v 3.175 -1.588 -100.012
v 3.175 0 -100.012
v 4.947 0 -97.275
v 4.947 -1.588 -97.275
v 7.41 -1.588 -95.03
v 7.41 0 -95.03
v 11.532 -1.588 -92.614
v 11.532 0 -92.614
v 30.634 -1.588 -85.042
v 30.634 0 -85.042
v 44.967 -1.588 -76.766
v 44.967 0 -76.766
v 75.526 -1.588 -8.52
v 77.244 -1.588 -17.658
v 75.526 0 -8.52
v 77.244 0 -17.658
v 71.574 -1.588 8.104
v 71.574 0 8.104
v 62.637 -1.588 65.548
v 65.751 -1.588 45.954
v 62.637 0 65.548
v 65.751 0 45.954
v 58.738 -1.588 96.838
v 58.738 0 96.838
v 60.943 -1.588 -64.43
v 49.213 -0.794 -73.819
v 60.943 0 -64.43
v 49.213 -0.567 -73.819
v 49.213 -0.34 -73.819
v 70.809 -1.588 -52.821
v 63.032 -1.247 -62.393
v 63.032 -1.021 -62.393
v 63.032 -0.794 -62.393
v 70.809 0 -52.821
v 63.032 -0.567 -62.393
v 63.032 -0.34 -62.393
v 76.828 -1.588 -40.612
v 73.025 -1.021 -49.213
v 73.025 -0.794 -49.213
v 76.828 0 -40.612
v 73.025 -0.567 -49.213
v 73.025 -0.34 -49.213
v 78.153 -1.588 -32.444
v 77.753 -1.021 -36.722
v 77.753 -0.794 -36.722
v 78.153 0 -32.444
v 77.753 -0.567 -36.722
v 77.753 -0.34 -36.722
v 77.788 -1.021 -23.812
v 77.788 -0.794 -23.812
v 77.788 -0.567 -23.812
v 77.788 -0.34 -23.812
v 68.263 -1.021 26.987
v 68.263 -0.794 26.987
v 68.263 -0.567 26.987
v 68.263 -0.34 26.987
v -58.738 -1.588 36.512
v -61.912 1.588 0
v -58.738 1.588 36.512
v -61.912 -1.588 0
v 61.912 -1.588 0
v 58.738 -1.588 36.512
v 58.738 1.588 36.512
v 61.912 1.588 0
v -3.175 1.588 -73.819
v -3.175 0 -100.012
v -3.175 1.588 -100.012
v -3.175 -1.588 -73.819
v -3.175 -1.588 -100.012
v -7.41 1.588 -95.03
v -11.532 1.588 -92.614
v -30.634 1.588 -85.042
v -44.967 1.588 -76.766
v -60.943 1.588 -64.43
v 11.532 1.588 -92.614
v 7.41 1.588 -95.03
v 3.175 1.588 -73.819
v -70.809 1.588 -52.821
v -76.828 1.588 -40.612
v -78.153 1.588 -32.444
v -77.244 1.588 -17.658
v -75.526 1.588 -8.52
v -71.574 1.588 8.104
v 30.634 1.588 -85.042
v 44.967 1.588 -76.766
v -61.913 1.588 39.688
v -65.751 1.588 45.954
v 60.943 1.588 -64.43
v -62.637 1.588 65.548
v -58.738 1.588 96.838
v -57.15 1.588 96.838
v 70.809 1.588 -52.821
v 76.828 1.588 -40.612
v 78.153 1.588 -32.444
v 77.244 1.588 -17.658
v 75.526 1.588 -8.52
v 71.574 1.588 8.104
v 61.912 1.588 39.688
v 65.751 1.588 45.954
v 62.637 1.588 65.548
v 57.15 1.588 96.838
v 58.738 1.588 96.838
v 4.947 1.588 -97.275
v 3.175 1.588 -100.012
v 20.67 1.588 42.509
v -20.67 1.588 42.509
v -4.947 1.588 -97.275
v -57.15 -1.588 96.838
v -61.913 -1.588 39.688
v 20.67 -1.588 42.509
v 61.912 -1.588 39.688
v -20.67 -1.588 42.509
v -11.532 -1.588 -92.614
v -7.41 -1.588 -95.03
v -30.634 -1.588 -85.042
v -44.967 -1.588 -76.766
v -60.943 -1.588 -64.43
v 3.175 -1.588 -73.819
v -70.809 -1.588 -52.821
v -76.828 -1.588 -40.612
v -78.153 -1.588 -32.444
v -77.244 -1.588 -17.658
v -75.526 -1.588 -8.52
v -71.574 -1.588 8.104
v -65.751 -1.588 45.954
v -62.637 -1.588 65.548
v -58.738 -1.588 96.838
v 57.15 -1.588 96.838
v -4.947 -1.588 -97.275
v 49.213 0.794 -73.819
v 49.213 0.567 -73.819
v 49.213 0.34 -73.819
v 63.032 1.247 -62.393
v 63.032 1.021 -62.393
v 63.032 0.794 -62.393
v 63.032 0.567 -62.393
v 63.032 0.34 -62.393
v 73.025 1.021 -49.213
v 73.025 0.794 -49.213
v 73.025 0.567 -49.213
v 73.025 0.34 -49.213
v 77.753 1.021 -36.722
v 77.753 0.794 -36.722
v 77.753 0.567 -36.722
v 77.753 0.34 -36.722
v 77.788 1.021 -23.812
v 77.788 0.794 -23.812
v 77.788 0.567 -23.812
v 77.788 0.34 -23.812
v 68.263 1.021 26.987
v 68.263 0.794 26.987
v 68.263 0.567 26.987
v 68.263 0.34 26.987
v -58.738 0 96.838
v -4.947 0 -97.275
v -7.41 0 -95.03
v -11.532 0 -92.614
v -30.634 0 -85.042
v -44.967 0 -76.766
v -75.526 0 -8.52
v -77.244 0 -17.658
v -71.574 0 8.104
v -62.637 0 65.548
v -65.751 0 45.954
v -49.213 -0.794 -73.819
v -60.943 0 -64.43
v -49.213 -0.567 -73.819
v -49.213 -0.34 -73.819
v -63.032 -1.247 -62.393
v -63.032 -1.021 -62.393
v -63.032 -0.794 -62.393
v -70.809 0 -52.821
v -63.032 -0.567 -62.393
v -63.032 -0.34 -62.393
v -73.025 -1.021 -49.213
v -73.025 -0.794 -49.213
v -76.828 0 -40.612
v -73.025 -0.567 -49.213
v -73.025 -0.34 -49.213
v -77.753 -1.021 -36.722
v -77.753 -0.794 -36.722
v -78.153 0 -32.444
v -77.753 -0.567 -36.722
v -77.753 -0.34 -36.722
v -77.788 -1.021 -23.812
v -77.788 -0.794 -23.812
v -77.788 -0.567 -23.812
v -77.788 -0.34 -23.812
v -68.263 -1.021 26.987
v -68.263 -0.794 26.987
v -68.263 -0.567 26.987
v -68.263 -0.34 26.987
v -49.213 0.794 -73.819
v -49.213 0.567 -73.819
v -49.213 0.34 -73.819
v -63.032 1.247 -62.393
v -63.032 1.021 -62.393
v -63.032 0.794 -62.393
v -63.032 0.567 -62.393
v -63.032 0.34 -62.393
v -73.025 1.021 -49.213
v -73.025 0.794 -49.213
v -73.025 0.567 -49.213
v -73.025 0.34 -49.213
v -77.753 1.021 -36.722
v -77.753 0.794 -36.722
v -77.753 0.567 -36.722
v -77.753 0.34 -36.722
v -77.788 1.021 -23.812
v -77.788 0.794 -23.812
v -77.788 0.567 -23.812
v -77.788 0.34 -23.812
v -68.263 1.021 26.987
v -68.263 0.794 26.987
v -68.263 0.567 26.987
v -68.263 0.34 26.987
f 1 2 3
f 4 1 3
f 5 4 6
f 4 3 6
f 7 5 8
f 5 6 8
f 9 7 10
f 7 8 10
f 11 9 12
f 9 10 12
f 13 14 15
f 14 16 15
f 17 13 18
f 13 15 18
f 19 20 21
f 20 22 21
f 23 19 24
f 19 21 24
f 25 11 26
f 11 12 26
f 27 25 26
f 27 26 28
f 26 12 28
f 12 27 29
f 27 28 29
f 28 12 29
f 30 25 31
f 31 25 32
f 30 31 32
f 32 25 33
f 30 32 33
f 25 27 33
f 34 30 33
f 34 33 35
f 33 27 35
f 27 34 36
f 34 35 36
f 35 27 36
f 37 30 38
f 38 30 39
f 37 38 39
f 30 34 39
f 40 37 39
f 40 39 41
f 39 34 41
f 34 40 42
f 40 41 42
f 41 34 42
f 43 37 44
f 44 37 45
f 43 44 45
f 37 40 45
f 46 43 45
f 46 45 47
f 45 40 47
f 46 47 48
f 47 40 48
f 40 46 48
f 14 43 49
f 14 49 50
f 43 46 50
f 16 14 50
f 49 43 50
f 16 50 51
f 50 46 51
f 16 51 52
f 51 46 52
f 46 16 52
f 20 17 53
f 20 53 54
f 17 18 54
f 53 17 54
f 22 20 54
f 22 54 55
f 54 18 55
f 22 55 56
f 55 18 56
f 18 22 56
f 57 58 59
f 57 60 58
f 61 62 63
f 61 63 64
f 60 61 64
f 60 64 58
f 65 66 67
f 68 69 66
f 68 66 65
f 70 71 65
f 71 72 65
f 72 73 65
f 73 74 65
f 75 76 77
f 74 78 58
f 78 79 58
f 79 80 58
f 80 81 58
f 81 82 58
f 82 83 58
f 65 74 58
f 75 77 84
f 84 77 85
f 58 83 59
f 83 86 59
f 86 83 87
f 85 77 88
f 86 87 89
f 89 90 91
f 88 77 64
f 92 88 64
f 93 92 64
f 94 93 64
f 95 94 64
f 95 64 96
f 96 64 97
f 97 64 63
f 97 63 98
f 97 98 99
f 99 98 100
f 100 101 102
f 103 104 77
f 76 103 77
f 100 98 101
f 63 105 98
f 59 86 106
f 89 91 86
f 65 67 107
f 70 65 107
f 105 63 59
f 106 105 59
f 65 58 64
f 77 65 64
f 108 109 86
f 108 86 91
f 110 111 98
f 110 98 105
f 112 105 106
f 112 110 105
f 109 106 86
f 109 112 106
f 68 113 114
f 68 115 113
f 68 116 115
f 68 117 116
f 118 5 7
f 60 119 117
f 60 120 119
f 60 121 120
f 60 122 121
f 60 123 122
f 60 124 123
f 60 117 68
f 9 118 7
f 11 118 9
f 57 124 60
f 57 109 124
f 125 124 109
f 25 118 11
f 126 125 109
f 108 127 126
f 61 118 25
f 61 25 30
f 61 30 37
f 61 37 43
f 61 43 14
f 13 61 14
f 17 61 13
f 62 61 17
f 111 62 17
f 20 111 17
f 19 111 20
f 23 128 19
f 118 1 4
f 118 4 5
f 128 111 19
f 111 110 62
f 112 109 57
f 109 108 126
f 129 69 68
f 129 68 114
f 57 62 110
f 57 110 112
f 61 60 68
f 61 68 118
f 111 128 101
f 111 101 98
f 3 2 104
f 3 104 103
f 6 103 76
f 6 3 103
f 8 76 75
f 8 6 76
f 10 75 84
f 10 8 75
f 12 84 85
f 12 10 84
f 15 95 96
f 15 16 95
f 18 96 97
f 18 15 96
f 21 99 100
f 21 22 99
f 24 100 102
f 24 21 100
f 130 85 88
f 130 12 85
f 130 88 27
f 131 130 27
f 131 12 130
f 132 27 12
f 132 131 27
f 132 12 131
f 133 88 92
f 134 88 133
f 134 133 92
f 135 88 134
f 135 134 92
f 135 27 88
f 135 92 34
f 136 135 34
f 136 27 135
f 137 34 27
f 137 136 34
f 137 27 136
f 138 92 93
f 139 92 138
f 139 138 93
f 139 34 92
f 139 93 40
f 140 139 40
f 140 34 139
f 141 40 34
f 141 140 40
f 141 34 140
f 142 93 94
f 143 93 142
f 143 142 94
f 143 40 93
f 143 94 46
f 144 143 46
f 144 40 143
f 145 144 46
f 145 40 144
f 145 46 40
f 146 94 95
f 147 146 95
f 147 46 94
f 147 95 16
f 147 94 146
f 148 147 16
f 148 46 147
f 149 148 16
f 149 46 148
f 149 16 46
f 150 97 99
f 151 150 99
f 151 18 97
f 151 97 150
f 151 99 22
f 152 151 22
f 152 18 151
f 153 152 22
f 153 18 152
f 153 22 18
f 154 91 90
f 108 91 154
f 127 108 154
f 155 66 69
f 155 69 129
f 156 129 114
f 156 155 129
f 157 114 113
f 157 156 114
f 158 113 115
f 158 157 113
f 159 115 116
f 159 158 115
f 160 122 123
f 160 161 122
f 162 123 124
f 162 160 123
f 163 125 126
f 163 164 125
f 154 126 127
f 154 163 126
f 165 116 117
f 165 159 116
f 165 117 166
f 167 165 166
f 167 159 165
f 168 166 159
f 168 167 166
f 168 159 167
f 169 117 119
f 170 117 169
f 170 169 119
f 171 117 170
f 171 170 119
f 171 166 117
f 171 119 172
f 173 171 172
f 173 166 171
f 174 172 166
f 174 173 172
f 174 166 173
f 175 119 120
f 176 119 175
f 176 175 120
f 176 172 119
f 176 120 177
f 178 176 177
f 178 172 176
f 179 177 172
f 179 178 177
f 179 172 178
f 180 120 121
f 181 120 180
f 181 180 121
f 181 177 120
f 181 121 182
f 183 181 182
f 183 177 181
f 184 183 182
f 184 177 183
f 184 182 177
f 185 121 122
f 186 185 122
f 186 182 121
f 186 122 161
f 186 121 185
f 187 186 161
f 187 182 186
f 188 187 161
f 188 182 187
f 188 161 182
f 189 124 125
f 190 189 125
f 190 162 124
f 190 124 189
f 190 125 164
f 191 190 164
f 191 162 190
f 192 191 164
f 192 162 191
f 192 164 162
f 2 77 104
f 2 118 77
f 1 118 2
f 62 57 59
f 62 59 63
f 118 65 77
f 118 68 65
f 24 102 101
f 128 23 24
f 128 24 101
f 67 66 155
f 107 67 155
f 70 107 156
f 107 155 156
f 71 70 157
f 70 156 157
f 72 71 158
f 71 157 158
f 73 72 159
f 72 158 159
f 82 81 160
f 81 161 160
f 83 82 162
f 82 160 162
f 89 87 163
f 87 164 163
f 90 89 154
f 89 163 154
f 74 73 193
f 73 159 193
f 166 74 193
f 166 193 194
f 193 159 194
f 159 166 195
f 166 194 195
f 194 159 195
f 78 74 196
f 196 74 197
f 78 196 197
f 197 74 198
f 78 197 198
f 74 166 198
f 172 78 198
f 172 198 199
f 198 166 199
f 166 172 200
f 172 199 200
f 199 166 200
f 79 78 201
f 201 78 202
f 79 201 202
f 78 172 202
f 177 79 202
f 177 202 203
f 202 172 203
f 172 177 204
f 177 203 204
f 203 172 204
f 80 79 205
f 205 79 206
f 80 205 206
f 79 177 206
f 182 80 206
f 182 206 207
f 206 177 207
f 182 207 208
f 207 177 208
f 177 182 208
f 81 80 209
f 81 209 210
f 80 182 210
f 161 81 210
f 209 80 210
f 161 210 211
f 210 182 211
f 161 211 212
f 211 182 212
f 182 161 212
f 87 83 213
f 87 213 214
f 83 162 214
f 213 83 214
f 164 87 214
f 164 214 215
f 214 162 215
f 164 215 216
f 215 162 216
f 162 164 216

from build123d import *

# Parameters (mm, degrees)
F1_DEPTH = 1.5875


with BuildPart() as f1:
    # F0 (on Front) → F1 (new body, symmetric)
    with BuildSketch(Plane.XZ):
        with BuildLine():
            Line((3.175, -73.81875), (3.175, -100.0125))
            add(Edge.make_bspline(
                [(3.175, -100.0125), (6.411305171, -92.9262640479), (26.9420658498, -88.6211589036), (49.0400078824, -74.4057093693), (63.7640870866, -62.6882829333), (73.4820704618, -49.6854803877), (78.7868311437, -36.7047715715), (77.7948145499, -23.8788944622), (76.7778891621, -10.8979727696), (72.4415654319, -0.1681327655), (70.9267643315, 14.432954895), (67.9657805127, 26.8569873917), (66.8635331533, 39.6952632597), (64.6234435115, 52.5310514913), (62.4307577863, 66.8225497006), (60.3287666669, 80.9252885312), (58.7375, 96.8375)],
                knots=[0, 0, 0, 0, 0.0893623901, 0.1817666312, 0.2579376083, 0.328311479, 0.3933607081, 0.4563050116, 0.5194937636, 0.5795392554, 0.6467606471, 0.7102510246, 0.7734397766, 0.8367647936, 0.9000898106, 1, 1, 1, 1], degree=3))
            Line((58.7375, 96.8375), (57.15, 96.8375))
            Line((57.15, 96.8375), (61.9125, 39.6875))
            ThreePointArc((61.9125, 39.6875), (0, 42.8625), (-61.9125, 39.6875))
            Line((-61.9125, 39.6875), (-57.15, 96.8375))
            Line((-57.15, 96.8375), (-58.7375, 96.8375))
            add(Edge.make_bspline(
                [(-3.175, -100.0125), (-6.411305171, -92.9262640479), (-26.9420658498, -88.6211589036), (-49.0400078824, -74.4057093693), (-63.7640870866, -62.6882829333), (-73.4820704618, -49.6854803877), (-78.7868311437, -36.7047715715), (-77.7948145499, -23.8788944622), (-76.7778891621, -10.8979727696), (-72.4415654319, -0.1681327655), (-70.9267643315, 14.432954895), (-67.9657805127, 26.8569873917), (-66.8635331533, 39.6952632597), (-64.6234435115, 52.5310514913), (-62.4307577863, 66.8225497006), (-60.3287666669, 80.9252885312), (-58.7375, 96.8375)],
                knots=[0, 0, 0, 0, 0.0893623901, 0.1817666312, 0.2579376083, 0.328311479, 0.3933607081, 0.4563050116, 0.5194937636, 0.5795392554, 0.6467606471, 0.7102510246, 0.7734397766, 0.8367647936, 0.9000898106, 1, 1, 1, 1], degree=3))
            Line((-3.175, -100.0125), (-3.175, -73.81875))
            Line((-3.175, -73.81875), (0, -73.81875))
            Line((0, -73.81875), (3.175, -73.81875))
        make_face()
        Polygon((-58.7375, 36.5125), (0, 36.5125), (58.7375, 36.5125), (61.9125, 0), (0, 0), (-61.9125, 0), align=None, mode=Mode.SUBTRACT)
    extrude(amount=F1_DEPTH, both=True)


solid = f1.part
